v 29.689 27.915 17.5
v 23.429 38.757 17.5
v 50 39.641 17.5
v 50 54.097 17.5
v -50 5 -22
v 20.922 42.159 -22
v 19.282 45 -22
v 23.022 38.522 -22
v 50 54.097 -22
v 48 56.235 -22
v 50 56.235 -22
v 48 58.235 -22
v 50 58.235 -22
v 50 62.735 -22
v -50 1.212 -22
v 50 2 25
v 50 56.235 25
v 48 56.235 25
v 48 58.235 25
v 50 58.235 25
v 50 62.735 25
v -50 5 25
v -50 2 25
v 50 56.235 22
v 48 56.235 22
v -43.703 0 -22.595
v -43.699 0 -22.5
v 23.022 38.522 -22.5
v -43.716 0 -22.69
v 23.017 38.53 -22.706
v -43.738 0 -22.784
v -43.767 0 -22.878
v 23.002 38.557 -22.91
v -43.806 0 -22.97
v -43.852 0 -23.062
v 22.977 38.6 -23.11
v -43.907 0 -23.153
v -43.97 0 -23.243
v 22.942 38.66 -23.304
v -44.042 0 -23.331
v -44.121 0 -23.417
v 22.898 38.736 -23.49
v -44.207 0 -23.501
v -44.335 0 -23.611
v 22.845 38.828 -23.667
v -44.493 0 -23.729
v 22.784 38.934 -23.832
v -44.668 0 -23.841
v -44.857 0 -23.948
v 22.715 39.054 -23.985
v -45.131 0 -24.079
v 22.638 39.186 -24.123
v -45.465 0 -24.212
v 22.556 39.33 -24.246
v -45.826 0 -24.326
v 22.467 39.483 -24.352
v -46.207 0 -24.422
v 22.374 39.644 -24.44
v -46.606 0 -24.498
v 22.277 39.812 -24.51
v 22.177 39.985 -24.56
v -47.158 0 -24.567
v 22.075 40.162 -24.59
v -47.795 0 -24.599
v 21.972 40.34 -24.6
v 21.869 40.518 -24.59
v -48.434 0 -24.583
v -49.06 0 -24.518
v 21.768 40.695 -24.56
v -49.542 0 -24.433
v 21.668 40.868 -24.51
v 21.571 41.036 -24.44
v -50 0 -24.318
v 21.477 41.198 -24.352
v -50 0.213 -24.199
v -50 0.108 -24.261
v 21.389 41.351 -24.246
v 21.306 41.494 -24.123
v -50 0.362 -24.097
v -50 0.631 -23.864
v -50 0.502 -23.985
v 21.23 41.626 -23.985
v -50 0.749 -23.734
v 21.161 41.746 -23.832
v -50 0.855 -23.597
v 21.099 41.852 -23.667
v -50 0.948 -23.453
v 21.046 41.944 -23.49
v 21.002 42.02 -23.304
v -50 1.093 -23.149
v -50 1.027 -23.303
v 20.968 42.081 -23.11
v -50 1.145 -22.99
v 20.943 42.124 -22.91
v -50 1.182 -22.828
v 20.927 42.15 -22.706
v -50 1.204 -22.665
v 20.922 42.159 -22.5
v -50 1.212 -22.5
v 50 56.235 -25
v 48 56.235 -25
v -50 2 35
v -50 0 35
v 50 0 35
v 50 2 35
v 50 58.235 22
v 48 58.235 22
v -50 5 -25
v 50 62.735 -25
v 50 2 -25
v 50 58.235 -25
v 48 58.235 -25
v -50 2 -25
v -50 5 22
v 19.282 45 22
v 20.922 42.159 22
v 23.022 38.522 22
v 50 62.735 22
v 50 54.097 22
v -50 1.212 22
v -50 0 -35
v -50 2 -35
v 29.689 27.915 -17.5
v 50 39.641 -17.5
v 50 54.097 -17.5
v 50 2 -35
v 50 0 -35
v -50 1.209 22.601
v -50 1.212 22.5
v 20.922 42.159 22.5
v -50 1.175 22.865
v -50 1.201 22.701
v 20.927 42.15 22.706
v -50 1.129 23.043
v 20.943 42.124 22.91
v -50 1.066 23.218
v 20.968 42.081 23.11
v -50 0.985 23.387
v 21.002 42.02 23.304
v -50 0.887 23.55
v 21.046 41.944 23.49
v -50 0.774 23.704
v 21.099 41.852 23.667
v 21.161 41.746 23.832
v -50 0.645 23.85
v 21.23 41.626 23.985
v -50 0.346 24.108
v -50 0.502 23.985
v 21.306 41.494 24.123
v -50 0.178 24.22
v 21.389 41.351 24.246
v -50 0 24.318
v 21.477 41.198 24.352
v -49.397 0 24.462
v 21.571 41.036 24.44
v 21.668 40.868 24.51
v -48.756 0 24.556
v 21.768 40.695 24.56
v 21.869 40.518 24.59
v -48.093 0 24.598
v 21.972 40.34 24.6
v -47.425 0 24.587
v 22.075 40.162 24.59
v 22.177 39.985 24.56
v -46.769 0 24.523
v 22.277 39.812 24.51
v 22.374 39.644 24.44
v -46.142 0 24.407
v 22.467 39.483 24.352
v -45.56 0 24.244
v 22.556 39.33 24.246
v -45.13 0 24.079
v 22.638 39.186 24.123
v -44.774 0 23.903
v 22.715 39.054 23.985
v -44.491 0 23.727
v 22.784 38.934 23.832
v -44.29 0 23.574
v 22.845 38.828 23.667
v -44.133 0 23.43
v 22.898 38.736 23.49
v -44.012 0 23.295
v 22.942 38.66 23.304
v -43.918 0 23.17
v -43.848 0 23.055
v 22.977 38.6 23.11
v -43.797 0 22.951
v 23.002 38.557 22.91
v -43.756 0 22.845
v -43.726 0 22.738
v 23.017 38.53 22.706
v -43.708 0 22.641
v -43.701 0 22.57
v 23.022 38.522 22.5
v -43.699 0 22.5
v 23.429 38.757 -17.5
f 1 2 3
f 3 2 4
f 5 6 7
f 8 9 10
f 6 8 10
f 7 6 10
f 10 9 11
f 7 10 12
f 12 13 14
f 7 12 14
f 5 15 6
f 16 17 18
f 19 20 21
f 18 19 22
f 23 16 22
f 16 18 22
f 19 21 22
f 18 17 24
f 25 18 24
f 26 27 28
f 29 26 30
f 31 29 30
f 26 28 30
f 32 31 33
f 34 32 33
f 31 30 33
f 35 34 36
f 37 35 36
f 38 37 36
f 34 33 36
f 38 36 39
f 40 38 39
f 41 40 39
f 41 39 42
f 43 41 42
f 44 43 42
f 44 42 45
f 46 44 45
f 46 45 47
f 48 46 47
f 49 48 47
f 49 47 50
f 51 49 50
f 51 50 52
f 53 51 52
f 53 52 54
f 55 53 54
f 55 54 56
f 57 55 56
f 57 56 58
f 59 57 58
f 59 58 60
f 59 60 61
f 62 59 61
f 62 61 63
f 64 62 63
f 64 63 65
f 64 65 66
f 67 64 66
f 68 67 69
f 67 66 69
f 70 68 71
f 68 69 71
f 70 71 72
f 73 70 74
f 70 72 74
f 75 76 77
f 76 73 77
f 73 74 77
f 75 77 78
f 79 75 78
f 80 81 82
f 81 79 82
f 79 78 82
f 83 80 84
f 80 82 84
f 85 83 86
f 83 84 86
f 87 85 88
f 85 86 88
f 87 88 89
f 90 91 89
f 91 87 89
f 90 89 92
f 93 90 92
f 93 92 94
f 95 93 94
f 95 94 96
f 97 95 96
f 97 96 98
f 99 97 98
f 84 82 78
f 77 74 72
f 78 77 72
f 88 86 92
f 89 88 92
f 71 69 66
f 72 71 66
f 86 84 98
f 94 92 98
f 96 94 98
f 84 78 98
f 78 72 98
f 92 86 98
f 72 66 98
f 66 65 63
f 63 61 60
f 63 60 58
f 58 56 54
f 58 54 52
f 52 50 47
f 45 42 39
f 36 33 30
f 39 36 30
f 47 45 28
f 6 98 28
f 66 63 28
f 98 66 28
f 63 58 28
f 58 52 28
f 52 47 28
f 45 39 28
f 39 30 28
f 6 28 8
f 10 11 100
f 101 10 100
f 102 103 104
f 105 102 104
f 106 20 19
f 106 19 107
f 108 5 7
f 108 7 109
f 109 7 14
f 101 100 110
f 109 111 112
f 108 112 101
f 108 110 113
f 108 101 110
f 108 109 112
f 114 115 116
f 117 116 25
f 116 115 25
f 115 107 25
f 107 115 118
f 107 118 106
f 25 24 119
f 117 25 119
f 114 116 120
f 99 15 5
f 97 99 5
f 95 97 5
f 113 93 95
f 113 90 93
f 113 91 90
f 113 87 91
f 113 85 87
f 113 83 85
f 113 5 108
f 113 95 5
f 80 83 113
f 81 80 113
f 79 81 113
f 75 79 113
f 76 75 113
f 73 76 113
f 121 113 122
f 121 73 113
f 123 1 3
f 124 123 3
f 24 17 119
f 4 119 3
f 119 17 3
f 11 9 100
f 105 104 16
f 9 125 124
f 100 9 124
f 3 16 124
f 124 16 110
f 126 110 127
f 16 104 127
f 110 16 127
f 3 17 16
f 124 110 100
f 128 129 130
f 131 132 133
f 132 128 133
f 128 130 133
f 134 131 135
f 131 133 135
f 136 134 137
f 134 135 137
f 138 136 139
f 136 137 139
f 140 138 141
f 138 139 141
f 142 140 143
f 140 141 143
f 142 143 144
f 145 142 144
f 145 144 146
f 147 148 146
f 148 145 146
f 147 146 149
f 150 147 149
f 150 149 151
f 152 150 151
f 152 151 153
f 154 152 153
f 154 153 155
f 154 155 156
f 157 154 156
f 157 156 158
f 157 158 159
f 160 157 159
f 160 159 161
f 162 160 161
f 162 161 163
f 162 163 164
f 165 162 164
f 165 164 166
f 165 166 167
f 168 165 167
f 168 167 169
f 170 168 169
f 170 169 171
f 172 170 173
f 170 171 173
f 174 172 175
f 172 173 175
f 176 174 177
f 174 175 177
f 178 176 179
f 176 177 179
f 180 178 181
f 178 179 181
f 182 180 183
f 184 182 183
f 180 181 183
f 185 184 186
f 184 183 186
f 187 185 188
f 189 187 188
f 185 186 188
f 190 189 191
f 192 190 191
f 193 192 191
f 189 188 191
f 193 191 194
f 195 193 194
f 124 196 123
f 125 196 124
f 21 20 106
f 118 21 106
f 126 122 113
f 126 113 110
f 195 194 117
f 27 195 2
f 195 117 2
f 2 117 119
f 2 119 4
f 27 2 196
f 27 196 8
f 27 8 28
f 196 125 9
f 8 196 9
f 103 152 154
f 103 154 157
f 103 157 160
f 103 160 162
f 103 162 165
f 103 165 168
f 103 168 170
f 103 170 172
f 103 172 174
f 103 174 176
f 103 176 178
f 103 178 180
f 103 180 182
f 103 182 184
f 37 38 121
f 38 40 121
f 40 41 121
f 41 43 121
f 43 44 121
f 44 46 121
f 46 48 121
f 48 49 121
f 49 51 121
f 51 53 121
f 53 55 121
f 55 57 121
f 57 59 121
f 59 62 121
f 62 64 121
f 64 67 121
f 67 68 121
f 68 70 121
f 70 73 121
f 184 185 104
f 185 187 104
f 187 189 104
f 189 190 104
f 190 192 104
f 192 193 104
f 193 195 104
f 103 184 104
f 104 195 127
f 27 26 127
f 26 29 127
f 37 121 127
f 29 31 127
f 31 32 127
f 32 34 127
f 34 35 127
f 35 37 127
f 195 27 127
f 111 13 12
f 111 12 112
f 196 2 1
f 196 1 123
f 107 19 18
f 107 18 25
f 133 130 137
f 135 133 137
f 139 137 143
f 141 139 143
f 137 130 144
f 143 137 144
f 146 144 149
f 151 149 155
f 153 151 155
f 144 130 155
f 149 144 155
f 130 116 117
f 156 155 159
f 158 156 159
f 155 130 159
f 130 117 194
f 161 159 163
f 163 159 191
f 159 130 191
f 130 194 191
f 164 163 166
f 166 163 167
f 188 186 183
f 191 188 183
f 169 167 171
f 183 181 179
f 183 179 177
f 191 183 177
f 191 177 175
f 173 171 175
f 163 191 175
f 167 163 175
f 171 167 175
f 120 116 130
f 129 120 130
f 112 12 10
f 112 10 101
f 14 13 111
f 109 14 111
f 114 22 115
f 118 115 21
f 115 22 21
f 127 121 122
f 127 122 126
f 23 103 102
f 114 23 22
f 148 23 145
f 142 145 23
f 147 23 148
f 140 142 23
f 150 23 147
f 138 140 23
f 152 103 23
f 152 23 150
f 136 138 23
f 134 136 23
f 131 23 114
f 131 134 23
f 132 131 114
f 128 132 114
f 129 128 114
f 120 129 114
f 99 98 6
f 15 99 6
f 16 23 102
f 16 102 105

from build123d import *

# Parameters (mm, degrees)
SKETCH3_W               = 100
SKETCH3_H               = 70
BOSS_EXTRUDE2_DEPTH     = 2
BOSS_EXTRUDE3_DEPTH     = 25
SKETCH7_W               = 35
SKETCH7_H               = 35
CUT_EXTRUDE3_DEPTH      = 20
CUT_EXTRUDE1_DEPTH      = 125.171613843
CUT_EXTRUDE1_DEPTH_BACK = 80
SKETCH8_W               = 44
SKETCH8_H               = 7.480636053
CUT_EXTRUDE4_DEPTH      = 101.661811193
SKETCH9_W               = 3
SKETCH9_H               = 2
CUT_EXTRUDE5_DEPTH      = 2


with BuildPart() as part:
    # Sketch3 → Boss-Extrude2 (new body)
    with BuildSketch(Plane(origin=(0, 0, 0), x_dir=(1, 0, 0), z_dir=(0, 1, 0))):
        Rectangle(SKETCH3_W, SKETCH3_H)
    extrude(amount=BOSS_EXTRUDE2_DEPTH)

    # Sketch4 → Boss-Extrude3 (add, symmetric)
    with BuildSketch(Plane.XY):
        Polygon((50, 62.735026919), (50, 2), (-50, 2), (-50, 5), align=None)
    extrude(amount=BOSS_EXTRUDE3_DEPTH, both=True)

    # Sketch7 → Cut-Extrude3 (cut)
    with BuildSketch(Plane(origin=(-14.665063509, 25.400635095, 0), x_dir=(0.8660254037844414, 0.49999999999999517, 0), z_dir=(-0.49999999999999517, 0.8660254037844414, 0))):
        with Locations((57.168783649, 0)):
            Rectangle(SKETCH7_W, SKETCH7_H)
    extrude(amount=-CUT_EXTRUDE3_DEPTH, mode=Mode.SUBTRACT)

    # Sketch5 → Cut-Extrude1 (cut, two sides: drawn at the far end of the back side and taken through both)
    with BuildSketch(Plane(origin=(-35.334936491, -20.400635095, 0), x_dir=(0, 0, -1), z_dir=(-0.8660254037844416, -0.4999999999999951, 0)).offset(-CUT_EXTRUDE1_DEPTH_BACK)):
        with BuildLine():
            Line((-22.5, -21.849490966), (22.5, -21.849490966))
            ThreePointArc((22.5, -21.849490966), (24.6, -23.949490966), (22.5, -26.049490966))
            Line((22.5, -26.049490966), (22, -26.049490966))
            Line((22, -26.049490966), (22, -29.330127019))
            Line((22, -29.330127019), (-22, -29.330127019))
            Line((-22, -29.330127019), (-22, -26.049490966))
            Line((-22, -26.049490966), (-22.5, -26.049490966))
            ThreePointArc((-22.5, -26.049490966), (-24.6, -23.949490966), (-22.5, -21.849490966))
        make_face()
    extrude(amount=CUT_EXTRUDE1_DEPTH + CUT_EXTRUDE1_DEPTH_BACK, mode=Mode.SUBTRACT)

    # Sketch8 → Cut-Extrude4 (cut, through all)
    with BuildSketch(Plane(origin=(33.947095812, 19.599364905, 0), x_dir=(0, 0, 1), z_dir=(-0.8660254037844414, -0.49999999999999517, 0))):
        with Locations((0, 25.589808993)):
            Rectangle(SKETCH8_W, SKETCH8_H)
    extrude(amount=-CUT_EXTRUDE4_DEPTH, mode=Mode.SUBTRACT)

    # Sketch9 → Cut-Extrude5 (cut)
    with BuildSketch(Plane(origin=(50, 0, 0), x_dir=(0, 0, -1), z_dir=(1, 0, 0))):
        with Locations((-23.5, 57.235026919)):
            Rectangle(SKETCH9_W, SKETCH9_H)
        with Locations((23.5, 57.235026919)):
            Rectangle(SKETCH9_W, SKETCH9_H)
    extrude(amount=-CUT_EXTRUDE5_DEPTH, mode=Mode.SUBTRACT)


solid = part.part
